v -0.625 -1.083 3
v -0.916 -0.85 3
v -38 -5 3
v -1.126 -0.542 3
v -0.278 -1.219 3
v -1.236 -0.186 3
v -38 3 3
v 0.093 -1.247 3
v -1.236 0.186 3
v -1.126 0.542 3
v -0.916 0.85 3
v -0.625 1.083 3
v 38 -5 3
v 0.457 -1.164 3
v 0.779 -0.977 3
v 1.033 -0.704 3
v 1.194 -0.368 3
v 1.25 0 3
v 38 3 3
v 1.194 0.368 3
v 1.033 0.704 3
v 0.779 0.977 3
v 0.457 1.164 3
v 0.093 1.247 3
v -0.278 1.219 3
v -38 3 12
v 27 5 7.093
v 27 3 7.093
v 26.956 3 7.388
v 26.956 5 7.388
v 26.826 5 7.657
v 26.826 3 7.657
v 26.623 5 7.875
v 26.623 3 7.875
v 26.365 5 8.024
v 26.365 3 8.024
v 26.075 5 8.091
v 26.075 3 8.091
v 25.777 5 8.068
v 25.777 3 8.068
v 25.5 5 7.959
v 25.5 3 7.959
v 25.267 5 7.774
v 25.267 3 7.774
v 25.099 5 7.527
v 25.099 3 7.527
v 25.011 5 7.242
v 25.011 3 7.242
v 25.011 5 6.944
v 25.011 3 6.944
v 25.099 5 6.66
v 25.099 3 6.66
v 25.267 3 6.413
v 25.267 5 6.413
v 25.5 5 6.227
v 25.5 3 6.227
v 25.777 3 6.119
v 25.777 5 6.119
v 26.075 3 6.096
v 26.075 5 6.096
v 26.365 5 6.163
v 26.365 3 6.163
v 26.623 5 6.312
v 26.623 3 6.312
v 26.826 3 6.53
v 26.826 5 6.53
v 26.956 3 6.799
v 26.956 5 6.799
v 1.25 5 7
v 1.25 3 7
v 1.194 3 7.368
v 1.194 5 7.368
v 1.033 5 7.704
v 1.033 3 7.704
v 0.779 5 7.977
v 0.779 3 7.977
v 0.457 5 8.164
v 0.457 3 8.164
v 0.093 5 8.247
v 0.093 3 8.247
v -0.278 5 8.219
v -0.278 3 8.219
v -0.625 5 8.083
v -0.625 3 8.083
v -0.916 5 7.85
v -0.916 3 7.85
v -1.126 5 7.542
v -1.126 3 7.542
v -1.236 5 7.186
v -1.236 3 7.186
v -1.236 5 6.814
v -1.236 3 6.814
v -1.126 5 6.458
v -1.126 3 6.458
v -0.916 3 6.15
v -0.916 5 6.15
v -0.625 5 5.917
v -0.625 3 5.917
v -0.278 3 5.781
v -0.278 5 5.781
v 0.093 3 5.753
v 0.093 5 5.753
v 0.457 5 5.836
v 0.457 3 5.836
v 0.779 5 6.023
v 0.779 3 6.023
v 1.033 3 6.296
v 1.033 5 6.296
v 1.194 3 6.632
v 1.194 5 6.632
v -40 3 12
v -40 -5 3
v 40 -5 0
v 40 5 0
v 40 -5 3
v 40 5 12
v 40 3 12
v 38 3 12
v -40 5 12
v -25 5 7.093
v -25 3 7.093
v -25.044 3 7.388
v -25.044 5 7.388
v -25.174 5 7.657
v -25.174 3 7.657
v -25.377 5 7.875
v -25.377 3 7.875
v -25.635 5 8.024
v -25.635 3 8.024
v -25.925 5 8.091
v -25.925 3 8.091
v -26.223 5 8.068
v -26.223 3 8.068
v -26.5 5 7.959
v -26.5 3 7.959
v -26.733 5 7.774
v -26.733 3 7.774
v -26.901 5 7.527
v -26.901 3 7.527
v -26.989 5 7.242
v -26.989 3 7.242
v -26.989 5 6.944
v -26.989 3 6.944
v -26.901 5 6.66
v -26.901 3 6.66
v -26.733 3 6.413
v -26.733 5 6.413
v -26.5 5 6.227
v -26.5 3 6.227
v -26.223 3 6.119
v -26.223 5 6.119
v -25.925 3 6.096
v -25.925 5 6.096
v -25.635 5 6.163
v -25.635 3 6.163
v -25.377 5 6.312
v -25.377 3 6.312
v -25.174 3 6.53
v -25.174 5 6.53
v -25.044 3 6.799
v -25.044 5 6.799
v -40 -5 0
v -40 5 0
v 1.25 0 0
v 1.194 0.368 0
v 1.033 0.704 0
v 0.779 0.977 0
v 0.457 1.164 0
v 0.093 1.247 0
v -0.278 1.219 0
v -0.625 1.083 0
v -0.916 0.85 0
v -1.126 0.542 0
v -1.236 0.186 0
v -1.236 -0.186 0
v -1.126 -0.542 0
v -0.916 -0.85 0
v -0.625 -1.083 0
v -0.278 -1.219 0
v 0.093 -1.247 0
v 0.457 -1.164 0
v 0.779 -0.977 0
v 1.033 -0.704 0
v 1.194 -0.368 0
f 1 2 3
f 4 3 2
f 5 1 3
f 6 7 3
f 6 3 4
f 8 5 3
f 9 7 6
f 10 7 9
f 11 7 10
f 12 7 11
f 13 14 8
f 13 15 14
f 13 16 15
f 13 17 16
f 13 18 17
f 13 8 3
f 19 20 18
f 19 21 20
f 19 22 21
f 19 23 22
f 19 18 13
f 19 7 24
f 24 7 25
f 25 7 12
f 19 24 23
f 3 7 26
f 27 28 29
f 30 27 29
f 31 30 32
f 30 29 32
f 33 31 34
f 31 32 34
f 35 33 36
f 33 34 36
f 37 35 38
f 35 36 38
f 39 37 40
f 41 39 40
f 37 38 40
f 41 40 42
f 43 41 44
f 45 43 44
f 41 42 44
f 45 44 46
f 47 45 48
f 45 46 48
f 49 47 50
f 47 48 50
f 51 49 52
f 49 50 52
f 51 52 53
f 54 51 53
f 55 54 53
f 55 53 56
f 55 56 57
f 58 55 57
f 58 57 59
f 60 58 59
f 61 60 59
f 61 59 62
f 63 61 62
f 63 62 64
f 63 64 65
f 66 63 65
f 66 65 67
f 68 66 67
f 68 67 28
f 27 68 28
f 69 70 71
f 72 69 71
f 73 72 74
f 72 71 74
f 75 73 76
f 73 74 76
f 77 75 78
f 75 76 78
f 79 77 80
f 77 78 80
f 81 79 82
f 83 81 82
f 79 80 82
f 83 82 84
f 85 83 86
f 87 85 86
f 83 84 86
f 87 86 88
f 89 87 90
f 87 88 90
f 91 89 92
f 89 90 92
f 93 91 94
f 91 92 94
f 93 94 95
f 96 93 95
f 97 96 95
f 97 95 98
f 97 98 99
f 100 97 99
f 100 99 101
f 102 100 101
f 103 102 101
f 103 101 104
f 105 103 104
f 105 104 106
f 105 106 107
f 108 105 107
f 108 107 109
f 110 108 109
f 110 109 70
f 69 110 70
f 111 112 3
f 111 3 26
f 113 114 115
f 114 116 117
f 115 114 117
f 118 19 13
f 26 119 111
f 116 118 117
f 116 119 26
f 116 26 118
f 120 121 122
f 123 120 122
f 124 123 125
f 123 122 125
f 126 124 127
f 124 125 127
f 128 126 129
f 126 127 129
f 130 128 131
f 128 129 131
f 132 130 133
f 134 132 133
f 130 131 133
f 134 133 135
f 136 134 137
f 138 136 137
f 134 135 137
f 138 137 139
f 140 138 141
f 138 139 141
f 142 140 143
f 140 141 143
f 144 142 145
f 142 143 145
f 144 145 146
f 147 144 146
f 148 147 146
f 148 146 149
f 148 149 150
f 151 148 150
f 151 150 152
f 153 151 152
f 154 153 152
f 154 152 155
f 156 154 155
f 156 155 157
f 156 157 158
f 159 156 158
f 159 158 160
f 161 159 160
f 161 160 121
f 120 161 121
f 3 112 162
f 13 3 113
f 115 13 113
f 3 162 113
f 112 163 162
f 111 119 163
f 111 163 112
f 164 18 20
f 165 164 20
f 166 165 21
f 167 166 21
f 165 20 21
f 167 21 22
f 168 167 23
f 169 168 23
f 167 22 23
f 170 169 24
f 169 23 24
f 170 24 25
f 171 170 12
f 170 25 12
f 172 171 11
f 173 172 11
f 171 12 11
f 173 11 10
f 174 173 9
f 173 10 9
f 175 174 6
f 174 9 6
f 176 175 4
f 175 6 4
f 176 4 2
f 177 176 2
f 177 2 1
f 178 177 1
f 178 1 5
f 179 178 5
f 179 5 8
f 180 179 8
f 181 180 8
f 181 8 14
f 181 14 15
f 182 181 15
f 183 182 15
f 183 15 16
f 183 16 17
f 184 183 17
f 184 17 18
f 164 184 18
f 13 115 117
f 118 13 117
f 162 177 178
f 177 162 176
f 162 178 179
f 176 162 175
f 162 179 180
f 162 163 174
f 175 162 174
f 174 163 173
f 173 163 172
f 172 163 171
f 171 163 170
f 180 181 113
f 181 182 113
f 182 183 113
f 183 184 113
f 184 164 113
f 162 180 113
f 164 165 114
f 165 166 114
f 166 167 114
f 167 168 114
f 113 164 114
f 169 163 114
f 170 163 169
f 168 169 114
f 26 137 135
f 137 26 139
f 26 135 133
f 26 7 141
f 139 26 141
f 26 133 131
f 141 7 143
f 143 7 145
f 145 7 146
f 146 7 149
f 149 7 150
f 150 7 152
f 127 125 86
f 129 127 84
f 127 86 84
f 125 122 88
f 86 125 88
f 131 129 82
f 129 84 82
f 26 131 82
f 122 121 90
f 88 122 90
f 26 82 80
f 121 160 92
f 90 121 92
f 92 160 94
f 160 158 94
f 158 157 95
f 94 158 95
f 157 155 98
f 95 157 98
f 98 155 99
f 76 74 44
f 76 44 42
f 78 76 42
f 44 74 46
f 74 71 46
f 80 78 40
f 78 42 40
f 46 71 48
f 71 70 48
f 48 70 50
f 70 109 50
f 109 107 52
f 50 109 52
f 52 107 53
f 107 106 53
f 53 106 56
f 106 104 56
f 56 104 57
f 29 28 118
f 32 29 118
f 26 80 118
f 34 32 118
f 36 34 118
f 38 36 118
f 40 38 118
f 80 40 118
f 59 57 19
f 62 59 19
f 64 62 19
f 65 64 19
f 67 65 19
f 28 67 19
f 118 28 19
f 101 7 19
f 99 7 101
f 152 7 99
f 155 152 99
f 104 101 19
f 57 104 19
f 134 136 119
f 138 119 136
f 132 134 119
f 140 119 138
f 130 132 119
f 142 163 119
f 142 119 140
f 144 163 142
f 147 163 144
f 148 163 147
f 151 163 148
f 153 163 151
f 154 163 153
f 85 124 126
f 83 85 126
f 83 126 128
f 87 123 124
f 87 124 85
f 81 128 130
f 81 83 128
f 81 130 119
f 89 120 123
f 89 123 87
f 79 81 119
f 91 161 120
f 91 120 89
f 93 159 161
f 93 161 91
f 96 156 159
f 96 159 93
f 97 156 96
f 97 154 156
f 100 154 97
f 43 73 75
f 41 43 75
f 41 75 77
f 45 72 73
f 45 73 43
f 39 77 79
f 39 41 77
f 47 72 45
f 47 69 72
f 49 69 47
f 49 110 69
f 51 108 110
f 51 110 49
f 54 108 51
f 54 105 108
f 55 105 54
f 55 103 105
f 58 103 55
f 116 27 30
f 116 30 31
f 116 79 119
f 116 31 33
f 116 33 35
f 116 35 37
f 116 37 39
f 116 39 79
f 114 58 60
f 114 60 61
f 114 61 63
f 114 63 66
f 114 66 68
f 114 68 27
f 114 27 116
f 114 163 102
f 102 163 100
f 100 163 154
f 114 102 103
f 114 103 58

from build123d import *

# Parameters (mm, degrees)
F0_W      = 80
F0_H      = 10
F1_DEPTH  = 3
F2_W      = 80
F2_H      = 2
F3_DEPTH  = 9
F4_R      = 1.25
F5_DEPTH  = 3.001
F6_R      = 1.25
F7_DEPTH  = 2.001
F9_DEPTH  = 2
F10_R     = 1
F11_DEPTH = 2.001


# Not quite as in the source:
# - a pattern or mirror of a feature is missing from the dataset's text; its kind, count and spacing are read off the source's solid


with BuildPart() as f1:
    # F0 (on Top) → F1 (new body)
    with BuildSketch(Plane.XY):
        Rectangle(F0_W, F0_H)
    extrude(amount=F1_DEPTH)

    # F2 (on face) → F3 (join)
    with BuildSketch(Plane.XY.offset(3)):
        with Locations((0, 4)):
            Rectangle(F2_W, F2_H)
    extrude(amount=F3_DEPTH)

    # F4 (on face) → F5 (cut, through all)
    with BuildSketch(Plane.XY.offset(3)):
        Circle(F4_R)
    extrude(amount=-F5_DEPTH, mode=Mode.SUBTRACT)

    # F6 (on face) → F7 (cut, through all)
    with BuildSketch(Plane.XZ.offset(-3)):
        with Locations((0, 7)):
            Circle(F6_R)
    extrude(amount=-F7_DEPTH, mode=Mode.SUBTRACT)

    # F8 (on face) → F9 (join)
    with BuildSketch(Plane(origin=(-40, 0, 0), x_dir=(0, -1, 0), z_dir=(-1, 0, 0))):
        Polygon((5, 3), (-3, 12), (-3, 3), align=None)
    f9 = extrude(amount=-F9_DEPTH)

    # F9_copies: F9 across plane
    add(f9.mirror(Plane(origin=(0, 0, 0), x_dir=(0, 0, 1), z_dir=(1, 0, 0))))

    # F10 (on face) → F11 (cut, through all)
    with BuildSketch(Plane.XZ.offset(-3)):
        with Locations((-26, 7.0934407413)):
            Circle(F10_R)
        with Locations((26, 7.0934407413)):
            Circle(F10_R)
    extrude(amount=-F11_DEPTH, mode=Mode.SUBTRACT)


solid = f1.part
